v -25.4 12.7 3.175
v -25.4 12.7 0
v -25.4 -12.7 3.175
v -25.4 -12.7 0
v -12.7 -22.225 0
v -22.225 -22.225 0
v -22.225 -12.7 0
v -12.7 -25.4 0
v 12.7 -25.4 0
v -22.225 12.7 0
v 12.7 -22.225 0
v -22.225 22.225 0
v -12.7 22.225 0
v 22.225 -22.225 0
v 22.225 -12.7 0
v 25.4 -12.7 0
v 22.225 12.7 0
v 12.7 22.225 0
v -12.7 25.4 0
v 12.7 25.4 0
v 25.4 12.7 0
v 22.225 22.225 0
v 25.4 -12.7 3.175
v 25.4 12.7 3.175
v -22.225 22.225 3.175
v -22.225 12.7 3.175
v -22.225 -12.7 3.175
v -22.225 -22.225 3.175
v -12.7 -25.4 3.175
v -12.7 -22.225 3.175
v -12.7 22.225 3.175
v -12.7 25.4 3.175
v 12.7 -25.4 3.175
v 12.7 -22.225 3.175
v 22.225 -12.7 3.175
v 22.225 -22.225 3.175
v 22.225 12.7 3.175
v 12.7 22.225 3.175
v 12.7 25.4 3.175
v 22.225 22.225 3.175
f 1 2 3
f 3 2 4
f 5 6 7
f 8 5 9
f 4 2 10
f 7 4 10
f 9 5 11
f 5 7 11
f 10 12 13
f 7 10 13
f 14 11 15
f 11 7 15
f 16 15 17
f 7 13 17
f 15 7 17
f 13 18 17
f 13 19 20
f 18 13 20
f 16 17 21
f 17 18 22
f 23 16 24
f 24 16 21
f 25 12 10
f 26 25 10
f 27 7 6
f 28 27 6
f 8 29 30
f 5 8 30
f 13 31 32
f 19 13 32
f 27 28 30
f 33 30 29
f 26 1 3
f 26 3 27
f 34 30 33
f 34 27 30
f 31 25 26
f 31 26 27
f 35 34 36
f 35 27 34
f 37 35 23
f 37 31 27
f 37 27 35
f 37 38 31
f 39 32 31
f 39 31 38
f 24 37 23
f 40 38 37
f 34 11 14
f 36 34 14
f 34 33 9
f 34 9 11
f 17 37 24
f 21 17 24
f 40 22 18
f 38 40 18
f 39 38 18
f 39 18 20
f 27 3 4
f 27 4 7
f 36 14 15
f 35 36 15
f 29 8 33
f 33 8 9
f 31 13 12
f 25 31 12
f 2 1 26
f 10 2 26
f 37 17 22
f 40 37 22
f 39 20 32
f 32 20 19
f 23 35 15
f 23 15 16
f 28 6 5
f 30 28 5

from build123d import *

# Parameters (mm, degrees)
F0_W     = 12.7
F0_H     = 3.175
F0_W_2   = 3.175
F0_H_2   = 12.7
F1_DEPTH = 3.175


with BuildPart() as f1:
    # F0 (on Top) → F1 (new body)
    with BuildSketch(Plane.XY):
        Polygon((-12.7, 22.225), (-22.225, 22.225), (-22.225, 12.7), (-22.225, 0), (-22.225, -12.7), (-22.225, -22.225), (-12.7, -22.225), (0, -22.225), (12.7, -22.225), (22.225, -22.225), (22.225, -12.7), (22.225, 0), (22.225, 12.7), (22.225, 22.225), (12.7, 22.225), (0, 22.225), align=None)
        with Locations((-6.35, 23.8125)):
            Rectangle(F0_W, F0_H)
        with Locations((6.35, 23.8125)):
            Rectangle(F0_W, F0_H)
        with Locations((23.8125, 6.35)):
            Rectangle(F0_W_2, F0_H_2)
        with Locations((23.8125, -6.35)):
            Rectangle(F0_W_2, F0_H_2)
        with Locations((6.35, -23.8125)):
            Rectangle(F0_W, F0_H)
        with Locations((-6.35, -23.8125)):
            Rectangle(F0_W, F0_H)
        with Locations((-23.8125, -6.35)):
            Rectangle(F0_W_2, F0_H_2)
        with Locations((-23.8125, 6.35)):
            Rectangle(F0_W_2, F0_H_2)
    extrude(amount=F1_DEPTH)


solid = f1.part
